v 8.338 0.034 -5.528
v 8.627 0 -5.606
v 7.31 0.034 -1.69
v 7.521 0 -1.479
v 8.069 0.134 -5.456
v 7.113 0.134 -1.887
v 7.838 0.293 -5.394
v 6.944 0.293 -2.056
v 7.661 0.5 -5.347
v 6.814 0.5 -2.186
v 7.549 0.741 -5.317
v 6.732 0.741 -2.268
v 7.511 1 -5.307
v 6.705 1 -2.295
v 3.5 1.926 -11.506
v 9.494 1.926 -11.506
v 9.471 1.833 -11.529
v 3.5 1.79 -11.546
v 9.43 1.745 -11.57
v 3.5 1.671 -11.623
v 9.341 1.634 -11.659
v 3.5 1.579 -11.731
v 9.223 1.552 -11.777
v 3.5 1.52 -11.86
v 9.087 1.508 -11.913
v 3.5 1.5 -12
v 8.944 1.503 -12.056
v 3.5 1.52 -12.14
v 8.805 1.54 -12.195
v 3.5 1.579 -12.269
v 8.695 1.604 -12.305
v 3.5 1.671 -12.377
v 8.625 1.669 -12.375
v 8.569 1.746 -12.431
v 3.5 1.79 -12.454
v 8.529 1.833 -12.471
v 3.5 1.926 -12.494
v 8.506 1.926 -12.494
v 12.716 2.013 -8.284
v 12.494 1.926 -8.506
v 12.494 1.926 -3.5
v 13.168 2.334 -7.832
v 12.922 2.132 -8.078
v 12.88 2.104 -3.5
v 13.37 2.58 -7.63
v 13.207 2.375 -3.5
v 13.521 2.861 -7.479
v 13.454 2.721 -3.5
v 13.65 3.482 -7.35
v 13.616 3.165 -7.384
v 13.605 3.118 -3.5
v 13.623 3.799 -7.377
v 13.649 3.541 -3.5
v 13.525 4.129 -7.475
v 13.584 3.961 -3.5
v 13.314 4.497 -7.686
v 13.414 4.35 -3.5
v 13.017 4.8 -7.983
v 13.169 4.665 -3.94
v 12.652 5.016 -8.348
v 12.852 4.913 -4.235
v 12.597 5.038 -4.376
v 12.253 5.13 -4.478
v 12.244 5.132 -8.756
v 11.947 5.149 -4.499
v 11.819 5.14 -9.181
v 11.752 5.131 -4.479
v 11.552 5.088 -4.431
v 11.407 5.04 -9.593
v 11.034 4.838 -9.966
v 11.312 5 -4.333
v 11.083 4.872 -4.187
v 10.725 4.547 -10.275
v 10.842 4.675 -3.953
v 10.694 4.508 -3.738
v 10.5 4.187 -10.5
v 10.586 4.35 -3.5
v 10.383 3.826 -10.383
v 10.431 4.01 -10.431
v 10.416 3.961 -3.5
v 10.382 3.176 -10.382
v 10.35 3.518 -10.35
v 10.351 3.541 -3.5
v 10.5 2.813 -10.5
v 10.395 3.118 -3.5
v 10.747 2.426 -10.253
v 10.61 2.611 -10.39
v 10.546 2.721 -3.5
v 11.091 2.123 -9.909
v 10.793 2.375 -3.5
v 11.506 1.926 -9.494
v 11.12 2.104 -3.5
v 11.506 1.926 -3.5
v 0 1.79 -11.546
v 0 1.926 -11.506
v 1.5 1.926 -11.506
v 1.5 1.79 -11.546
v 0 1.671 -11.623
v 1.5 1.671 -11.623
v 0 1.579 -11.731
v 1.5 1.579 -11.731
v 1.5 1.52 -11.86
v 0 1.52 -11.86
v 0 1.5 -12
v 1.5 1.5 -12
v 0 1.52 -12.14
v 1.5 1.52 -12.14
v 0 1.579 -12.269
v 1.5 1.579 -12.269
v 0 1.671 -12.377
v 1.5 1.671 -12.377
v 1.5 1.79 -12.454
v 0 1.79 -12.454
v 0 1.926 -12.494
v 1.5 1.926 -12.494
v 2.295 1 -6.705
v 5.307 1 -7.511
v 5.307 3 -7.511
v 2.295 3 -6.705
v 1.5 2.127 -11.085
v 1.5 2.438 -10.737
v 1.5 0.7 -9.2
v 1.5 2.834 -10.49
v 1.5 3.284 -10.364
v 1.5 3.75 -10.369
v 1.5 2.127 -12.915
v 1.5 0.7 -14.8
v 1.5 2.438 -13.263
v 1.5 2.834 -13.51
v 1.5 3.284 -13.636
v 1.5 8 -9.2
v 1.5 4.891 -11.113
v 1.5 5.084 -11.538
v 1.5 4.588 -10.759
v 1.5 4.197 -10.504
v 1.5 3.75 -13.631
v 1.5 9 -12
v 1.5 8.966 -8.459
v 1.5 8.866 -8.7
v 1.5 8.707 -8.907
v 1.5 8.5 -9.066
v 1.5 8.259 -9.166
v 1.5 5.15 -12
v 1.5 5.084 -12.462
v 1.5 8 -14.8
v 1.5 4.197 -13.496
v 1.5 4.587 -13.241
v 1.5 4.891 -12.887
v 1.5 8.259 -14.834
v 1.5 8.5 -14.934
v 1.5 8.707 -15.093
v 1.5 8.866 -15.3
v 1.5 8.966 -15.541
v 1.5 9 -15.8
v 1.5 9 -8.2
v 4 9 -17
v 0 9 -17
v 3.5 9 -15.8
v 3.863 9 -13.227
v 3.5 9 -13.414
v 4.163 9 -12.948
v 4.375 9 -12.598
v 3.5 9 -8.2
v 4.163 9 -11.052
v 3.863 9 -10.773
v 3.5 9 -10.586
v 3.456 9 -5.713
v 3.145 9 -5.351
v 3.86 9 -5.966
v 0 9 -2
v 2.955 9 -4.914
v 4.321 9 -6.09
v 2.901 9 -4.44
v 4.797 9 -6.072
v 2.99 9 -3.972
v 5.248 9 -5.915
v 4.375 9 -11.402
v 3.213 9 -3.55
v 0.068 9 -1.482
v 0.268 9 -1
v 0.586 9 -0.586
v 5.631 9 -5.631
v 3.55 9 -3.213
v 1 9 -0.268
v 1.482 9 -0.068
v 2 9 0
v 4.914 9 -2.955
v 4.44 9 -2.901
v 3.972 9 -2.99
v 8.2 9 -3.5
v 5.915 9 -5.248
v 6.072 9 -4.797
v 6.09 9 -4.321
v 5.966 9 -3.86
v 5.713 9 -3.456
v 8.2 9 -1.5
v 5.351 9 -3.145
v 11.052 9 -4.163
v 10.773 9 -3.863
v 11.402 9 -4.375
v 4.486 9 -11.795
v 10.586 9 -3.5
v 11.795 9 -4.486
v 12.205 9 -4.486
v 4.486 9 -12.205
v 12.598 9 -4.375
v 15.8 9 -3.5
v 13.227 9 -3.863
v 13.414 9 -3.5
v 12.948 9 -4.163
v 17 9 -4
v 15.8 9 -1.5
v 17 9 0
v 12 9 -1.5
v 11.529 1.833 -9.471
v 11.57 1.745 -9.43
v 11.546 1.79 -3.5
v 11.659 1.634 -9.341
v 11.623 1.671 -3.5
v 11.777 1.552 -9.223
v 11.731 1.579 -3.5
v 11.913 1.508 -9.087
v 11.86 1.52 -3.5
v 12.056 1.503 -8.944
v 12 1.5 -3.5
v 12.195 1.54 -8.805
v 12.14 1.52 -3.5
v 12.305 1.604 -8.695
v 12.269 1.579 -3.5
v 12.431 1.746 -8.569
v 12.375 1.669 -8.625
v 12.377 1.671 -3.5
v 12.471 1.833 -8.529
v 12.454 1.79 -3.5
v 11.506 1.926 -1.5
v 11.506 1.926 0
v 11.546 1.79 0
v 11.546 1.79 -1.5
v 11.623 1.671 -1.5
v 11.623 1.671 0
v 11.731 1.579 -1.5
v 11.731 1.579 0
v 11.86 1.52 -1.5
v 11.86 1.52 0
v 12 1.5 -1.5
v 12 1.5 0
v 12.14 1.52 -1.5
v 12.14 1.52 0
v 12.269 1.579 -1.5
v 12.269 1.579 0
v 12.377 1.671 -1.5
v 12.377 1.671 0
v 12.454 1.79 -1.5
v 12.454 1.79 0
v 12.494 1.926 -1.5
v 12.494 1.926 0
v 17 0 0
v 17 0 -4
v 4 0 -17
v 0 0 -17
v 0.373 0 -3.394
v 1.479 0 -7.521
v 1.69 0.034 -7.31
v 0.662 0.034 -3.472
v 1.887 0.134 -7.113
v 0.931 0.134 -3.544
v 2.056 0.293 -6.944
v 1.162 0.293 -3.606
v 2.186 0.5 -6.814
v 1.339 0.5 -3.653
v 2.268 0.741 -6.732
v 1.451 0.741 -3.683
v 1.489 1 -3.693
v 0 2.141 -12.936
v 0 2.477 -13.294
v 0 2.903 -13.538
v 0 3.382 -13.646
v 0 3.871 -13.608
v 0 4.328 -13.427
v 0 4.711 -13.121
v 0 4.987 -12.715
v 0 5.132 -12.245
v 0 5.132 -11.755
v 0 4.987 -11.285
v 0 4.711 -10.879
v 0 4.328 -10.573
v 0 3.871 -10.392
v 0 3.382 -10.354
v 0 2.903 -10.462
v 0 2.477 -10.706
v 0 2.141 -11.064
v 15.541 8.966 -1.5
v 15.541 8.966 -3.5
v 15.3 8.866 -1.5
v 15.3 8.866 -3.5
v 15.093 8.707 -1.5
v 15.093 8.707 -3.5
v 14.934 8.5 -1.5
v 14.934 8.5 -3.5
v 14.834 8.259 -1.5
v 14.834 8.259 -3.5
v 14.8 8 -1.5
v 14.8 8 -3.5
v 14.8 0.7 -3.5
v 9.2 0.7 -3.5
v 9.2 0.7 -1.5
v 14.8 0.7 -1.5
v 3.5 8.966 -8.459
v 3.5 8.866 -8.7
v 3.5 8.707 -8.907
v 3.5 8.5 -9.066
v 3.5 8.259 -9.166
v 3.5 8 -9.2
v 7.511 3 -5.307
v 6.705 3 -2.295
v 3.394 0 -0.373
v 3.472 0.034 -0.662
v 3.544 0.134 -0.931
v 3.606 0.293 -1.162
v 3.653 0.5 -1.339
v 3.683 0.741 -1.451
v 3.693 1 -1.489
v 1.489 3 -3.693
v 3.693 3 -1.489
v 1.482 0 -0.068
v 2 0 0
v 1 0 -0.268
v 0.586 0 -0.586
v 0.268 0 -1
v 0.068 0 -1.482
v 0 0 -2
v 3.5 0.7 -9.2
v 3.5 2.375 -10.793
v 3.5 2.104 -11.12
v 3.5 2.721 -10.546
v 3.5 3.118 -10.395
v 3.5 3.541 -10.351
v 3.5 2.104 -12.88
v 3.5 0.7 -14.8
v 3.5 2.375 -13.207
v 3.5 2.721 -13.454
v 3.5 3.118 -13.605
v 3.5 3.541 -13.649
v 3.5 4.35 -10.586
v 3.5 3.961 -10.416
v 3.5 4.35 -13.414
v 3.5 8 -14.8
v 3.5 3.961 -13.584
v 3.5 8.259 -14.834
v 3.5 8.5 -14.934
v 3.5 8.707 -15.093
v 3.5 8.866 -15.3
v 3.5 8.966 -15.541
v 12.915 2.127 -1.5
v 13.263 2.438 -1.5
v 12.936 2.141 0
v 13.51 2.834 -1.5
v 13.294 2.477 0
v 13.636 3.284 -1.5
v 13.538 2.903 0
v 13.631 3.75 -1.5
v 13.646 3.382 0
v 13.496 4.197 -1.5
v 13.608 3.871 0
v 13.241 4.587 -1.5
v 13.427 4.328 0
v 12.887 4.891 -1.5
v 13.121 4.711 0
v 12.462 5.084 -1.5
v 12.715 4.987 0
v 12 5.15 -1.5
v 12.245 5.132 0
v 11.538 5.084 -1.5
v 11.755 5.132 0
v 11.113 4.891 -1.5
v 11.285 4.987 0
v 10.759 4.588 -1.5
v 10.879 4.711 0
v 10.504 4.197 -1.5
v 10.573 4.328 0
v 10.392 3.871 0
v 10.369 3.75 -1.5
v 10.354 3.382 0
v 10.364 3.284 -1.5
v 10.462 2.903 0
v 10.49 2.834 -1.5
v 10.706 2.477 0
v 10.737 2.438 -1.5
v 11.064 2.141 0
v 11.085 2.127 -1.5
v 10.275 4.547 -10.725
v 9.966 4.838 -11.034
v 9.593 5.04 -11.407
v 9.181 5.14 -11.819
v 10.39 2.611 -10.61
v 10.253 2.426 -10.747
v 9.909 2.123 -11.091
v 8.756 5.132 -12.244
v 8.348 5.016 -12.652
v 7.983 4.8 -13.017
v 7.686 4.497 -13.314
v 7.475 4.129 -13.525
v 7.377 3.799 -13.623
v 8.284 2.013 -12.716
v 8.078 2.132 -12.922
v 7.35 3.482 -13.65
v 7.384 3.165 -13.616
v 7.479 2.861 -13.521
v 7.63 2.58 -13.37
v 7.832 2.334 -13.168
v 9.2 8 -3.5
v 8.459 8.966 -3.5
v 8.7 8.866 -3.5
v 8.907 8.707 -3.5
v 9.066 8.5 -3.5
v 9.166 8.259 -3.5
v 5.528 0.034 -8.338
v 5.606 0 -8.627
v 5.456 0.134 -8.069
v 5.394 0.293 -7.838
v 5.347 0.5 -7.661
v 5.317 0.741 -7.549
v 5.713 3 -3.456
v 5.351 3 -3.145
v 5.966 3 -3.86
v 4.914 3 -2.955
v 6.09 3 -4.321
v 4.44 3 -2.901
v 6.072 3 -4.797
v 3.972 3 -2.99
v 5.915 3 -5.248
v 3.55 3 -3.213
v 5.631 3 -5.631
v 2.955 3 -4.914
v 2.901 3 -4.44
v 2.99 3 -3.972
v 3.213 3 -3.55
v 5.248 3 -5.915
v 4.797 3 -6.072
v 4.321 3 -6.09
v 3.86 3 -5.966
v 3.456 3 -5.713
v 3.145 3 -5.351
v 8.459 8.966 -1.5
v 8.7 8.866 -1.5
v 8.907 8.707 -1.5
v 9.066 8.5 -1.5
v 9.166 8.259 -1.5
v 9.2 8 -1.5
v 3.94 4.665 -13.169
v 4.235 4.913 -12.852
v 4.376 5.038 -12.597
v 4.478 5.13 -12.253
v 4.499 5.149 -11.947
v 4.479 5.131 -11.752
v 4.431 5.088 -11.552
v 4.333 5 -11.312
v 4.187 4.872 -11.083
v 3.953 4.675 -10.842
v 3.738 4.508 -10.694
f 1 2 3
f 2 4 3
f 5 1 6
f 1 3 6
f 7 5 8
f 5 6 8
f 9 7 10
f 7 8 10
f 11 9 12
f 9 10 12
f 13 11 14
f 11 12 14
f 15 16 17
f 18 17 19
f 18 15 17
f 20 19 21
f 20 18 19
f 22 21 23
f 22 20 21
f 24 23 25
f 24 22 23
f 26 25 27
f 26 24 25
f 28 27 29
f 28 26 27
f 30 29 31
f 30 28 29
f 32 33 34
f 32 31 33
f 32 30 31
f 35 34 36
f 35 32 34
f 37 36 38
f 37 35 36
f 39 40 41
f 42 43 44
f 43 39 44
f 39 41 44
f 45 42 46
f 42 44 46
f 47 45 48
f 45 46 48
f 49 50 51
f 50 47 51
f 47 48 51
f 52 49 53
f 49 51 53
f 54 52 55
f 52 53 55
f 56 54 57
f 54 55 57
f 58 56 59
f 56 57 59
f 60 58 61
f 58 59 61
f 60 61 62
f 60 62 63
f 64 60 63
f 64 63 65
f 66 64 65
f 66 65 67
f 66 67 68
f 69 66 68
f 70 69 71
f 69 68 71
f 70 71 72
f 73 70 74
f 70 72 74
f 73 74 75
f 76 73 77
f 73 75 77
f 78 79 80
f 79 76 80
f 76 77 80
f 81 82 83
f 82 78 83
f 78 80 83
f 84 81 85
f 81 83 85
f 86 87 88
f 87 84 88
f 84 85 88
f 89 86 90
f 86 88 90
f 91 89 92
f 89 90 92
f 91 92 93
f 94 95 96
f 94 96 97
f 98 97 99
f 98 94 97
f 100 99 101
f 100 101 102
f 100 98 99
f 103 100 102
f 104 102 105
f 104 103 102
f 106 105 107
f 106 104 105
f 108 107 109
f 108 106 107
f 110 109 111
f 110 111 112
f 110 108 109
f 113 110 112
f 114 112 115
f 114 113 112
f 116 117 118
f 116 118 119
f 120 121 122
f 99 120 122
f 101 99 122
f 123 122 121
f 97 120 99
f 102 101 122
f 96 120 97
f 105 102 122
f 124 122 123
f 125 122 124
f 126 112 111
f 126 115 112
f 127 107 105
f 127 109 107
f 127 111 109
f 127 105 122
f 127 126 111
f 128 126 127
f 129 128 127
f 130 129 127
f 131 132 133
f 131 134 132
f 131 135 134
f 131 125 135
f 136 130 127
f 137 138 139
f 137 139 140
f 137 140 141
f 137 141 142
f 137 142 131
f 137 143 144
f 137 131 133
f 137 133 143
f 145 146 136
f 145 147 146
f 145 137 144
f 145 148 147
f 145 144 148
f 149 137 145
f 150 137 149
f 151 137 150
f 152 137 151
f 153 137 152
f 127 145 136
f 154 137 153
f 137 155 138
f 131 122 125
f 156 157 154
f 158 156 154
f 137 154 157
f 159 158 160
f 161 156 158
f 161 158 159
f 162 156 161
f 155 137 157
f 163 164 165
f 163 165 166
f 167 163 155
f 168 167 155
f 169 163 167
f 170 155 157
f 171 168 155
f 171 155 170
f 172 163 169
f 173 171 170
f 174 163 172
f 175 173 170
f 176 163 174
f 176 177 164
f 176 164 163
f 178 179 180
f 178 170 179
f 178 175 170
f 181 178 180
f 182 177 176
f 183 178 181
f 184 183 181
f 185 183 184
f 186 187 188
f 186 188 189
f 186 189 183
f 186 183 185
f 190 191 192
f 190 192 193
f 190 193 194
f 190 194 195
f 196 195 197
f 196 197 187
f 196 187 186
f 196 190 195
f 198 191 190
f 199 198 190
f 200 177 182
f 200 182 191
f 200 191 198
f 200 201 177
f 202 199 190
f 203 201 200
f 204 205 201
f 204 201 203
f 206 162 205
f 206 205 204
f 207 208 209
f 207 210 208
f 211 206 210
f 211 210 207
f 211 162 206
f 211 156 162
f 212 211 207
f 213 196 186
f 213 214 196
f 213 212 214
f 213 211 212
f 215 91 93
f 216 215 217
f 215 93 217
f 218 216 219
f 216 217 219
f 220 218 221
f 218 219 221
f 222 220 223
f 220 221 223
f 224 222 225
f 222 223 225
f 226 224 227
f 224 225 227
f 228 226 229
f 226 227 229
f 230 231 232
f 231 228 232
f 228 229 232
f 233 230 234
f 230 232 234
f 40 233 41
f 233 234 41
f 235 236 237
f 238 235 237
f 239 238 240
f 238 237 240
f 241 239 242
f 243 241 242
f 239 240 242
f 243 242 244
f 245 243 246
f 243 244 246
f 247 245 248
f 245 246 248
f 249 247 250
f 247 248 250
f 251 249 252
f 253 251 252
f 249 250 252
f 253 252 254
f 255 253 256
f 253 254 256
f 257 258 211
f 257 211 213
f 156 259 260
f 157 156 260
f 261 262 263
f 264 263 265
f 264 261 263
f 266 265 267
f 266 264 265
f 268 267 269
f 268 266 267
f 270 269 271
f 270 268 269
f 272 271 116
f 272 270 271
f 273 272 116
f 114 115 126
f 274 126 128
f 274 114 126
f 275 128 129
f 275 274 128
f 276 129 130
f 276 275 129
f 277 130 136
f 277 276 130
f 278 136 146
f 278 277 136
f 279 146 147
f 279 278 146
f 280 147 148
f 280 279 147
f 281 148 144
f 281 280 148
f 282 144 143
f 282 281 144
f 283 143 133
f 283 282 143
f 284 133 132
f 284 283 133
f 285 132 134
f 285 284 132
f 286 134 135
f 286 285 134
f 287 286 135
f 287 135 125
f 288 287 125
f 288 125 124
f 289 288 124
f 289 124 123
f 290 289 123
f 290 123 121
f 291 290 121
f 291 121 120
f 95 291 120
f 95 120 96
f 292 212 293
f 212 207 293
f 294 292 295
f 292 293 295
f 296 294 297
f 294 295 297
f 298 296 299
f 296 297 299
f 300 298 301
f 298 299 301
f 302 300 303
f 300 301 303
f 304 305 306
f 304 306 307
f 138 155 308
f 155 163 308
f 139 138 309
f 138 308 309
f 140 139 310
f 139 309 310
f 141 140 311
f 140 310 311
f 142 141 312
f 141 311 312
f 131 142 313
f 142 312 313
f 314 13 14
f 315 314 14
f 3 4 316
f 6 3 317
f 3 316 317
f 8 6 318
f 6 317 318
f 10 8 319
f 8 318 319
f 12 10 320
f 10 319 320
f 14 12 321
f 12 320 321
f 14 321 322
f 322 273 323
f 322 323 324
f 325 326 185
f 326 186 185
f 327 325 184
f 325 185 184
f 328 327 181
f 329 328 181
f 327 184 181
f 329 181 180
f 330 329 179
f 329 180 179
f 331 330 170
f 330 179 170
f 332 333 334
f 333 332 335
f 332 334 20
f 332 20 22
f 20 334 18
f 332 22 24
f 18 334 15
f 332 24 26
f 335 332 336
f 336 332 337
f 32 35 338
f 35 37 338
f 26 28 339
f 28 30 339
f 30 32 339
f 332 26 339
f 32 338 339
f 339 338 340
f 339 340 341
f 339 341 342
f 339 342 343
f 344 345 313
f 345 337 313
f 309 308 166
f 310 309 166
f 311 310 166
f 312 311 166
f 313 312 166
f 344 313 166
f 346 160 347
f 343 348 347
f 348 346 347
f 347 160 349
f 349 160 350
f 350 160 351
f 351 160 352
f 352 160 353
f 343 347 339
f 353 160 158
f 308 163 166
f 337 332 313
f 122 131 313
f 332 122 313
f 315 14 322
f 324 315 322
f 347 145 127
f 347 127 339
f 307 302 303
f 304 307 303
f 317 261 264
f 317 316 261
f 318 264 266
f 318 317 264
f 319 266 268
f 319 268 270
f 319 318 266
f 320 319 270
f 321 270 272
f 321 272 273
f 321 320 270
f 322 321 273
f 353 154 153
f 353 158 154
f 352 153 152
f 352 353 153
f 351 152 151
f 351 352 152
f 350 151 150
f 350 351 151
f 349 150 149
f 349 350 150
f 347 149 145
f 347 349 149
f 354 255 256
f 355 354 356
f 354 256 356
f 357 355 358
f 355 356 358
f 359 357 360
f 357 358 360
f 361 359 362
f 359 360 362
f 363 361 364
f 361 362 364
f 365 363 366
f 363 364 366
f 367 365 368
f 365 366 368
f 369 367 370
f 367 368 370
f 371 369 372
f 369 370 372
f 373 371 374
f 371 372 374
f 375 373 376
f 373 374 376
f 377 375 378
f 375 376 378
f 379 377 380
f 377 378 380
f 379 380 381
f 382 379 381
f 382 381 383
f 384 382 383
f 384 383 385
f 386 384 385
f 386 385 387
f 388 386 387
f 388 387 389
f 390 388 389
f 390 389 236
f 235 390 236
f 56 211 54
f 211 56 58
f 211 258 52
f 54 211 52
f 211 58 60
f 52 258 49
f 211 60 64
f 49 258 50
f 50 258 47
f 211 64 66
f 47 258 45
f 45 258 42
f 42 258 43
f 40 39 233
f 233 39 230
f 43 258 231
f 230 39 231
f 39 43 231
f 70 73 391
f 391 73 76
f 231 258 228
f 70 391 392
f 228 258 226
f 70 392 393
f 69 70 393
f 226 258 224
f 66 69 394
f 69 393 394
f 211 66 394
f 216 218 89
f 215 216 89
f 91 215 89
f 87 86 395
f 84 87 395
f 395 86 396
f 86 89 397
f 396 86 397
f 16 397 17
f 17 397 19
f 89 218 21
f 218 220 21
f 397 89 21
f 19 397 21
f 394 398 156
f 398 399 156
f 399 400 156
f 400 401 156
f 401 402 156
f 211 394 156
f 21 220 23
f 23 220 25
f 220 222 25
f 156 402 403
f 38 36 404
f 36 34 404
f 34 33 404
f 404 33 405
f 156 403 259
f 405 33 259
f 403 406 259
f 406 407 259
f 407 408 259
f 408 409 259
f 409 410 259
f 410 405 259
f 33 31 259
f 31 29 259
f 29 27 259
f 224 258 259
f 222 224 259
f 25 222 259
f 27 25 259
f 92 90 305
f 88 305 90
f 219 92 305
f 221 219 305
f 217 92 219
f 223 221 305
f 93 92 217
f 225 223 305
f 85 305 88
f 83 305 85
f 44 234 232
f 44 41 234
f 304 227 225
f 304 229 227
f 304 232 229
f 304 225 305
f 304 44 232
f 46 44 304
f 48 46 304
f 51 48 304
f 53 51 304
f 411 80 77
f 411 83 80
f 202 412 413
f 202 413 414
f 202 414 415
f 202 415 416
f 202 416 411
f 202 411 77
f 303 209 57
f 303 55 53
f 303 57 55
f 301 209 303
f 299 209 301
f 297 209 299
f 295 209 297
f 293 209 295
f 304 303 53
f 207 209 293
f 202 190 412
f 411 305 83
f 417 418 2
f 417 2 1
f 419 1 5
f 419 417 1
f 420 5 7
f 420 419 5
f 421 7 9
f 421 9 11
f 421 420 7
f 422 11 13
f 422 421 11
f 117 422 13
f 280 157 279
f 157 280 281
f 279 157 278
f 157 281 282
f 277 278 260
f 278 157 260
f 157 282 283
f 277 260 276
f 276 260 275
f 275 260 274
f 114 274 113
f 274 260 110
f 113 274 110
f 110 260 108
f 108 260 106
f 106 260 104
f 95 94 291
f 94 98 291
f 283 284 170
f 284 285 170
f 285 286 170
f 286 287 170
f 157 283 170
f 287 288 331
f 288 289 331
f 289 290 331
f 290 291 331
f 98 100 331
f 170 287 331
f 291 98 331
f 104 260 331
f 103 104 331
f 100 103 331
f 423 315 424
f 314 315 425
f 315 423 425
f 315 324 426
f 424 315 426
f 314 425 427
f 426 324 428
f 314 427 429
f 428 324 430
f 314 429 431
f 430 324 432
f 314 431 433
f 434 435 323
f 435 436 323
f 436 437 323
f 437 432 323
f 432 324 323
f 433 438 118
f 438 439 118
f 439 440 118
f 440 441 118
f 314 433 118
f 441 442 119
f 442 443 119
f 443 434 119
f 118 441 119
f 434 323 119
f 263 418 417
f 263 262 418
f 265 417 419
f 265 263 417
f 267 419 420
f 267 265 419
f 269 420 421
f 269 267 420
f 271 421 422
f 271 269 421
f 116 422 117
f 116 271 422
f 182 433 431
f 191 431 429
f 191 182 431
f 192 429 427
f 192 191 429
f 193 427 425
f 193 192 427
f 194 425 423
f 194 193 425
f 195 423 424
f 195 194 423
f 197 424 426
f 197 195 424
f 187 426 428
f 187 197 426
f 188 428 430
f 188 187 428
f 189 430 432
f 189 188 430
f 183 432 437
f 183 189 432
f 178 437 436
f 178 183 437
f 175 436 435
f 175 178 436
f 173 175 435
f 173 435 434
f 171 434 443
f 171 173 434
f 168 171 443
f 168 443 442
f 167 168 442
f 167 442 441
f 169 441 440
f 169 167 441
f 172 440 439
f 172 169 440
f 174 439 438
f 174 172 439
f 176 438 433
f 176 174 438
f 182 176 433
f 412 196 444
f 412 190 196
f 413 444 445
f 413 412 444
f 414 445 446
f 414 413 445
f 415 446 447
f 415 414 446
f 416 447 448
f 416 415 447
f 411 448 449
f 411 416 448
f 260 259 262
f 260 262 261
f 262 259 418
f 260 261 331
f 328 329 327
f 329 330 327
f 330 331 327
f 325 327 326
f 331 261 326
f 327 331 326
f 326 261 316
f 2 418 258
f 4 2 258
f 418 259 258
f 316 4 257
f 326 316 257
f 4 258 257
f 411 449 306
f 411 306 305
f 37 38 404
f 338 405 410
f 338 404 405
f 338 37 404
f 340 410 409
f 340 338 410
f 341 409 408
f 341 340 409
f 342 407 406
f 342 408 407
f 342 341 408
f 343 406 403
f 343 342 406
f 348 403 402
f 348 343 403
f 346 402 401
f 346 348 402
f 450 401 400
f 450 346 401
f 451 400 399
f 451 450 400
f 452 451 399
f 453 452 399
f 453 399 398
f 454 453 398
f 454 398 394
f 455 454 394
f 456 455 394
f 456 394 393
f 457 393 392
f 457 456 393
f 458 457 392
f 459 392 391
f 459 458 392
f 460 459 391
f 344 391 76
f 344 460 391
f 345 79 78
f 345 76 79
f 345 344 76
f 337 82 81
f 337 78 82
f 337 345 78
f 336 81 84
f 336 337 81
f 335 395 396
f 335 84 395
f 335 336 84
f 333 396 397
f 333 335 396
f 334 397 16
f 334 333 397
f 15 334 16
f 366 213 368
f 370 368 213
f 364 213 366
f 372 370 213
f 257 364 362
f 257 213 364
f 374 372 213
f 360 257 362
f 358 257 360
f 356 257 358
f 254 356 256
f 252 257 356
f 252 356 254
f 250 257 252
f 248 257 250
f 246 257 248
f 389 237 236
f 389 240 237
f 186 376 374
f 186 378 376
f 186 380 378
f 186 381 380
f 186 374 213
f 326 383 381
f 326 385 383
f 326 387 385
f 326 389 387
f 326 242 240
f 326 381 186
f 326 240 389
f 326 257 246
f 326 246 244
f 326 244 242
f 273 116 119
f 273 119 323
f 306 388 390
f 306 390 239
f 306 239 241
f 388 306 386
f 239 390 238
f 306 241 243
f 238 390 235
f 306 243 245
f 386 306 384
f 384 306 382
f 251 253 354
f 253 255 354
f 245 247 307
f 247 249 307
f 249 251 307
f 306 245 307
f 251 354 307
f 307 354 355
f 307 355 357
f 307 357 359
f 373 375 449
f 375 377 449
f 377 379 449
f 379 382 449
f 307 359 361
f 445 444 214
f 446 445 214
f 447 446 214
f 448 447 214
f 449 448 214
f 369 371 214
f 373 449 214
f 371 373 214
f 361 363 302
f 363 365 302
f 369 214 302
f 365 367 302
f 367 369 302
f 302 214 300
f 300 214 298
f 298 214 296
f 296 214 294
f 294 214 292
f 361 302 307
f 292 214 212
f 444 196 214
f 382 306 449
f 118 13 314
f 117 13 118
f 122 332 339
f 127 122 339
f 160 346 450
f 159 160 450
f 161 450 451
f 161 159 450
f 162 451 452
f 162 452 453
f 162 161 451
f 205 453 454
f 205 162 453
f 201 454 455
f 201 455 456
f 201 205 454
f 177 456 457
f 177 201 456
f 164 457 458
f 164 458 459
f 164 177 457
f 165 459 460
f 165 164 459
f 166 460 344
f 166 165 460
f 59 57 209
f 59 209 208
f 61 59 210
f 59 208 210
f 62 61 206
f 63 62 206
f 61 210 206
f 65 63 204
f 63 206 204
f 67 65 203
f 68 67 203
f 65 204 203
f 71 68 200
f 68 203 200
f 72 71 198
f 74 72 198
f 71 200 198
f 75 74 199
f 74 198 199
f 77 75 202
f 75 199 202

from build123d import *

# Parameters (mm, degrees)
BOSS_EXTRUDE1_DEPTH     = 9
SKETCH2_W               = 5.6
SKETCH2_H               = 2
CUT_EXTRUDE1_DEPTH      = 8.3
CUT_EXTRUDE2_DEPTH      = 22.914607001
CUT_EXTRUDE5_REACH      = 23.915
CUT_EXTRUDE5_END_RADIUS = 1.65
SKETCH16_R              = 1.5
FILLET2_R               = 1
SKETCH6_R               = 1.6
CUT_EXTRUDE3_DEPTH      = 22.914607049
CUT_EXTRUDE4_DEPTH      = 3
FILLET3_R               = 1
FILLET1_R               = 2


with BuildPart() as part:
    # Sketch1 → Boss-Extrude1 (new body)
    with BuildSketch(Plane(origin=(0, 0, 0), x_dir=(1, 0, 0), z_dir=(0, 1, 0))):
        Polygon((10.5, 10.5), (17, 4), (17, 0), (0, 0), align=None)
    extrude(amount=BOSS_EXTRUDE1_DEPTH)

    # Sketch2 → Cut-Extrude1 (cut)
    with BuildSketch(Plane(origin=(0, 9, 0), x_dir=(1, 0, 0), z_dir=(0, 1, 0))):
        with Locations((12, 2.5)):
            Rectangle(SKETCH2_W, SKETCH2_H)
    extrude(amount=-CUT_EXTRUDE1_DEPTH, mode=Mode.SUBTRACT)

    # Sketch4 → Cut-Extrude2 (cut, through all)
    with BuildSketch(Plane.XY):
        with BuildLine():
            ThreePointArc((12.49446871, 1.925833333), (12, 5.15), (11.50553129, 1.925833333))
            ThreePointArc((11.50553129, 1.925833333), (12, 1.5), (12.49446871, 1.925833333))
        make_face()
    extrude(amount=-CUT_EXTRUDE2_DEPTH, mode=Mode.SUBTRACT)

    # Cut-Extrude5: up to this cylinder (the profile starts outside it)
    cut_extrude5_end = Plane(origin=(12, 3.5, -3), z_dir=(0, 0, 1)) * Cylinder(CUT_EXTRUDE5_END_RADIUS, 52.13, mode=Mode.PRIVATE)
    # Sketch16 → Cut-Extrude5 (cut, up to the surface)
    with BuildSketch(Plane(origin=(0, 9, 0), x_dir=(1, 0, 0), z_dir=(0, 1, 0)), mode=Mode.PRIVATE) as cut_extrude5_sk1:
        with Locations((12, 3)):
            Circle(SKETCH16_R)
    cut_extrude5_tool1 = extrude(cut_extrude5_sk1.sketch, amount=-CUT_EXTRUDE5_REACH, mode=Mode.PRIVATE) - cut_extrude5_end
    add(cut_extrude5_tool1.solids().sort_by_distance((12, 9, -3))[0], mode=Mode.SUBTRACT)

    # Fillet2
    fillet2_edges = [part.edges().sort_by_distance(p)[0] for p in [
        (14.8, 9, -2.5),
        (9.2, 9, -2.5),
    ]]
    fillet(fillet2_edges, radius=FILLET2_R)

    # Sketch6 → Cut-Extrude3 (cut, through all)
    with BuildSketch(Plane(origin=(0, 9, 0), x_dir=(1, 0, 0), z_dir=(0, 1, 0))):
        with Locations((4.5, 4.5)):
            Circle(SKETCH6_R)
    extrude(amount=-CUT_EXTRUDE3_DEPTH, mode=Mode.SUBTRACT)

    # Sketch9 → Cut-Extrude4 (cut)
    with BuildSketch(Plane.XZ):
        Polygon((7.511458693, -5.306917925), (6.704540769, -2.295459231), (3.693082075, -1.488541307), (1.488541307, -3.693082075), (2.295459231, -6.704540769), (5.306917925, -7.511458693), align=None)
    extrude(amount=-CUT_EXTRUDE4_DEPTH, mode=Mode.SUBTRACT)

    # Fillet3
    fillet3_edges = [part.edges().sort_by_distance(p)[0] for p in [
        (6.960323501, 0, -5.858053117),
        (7.107999731, 0, -3.801188578),
        (5.198811422, 0, -1.892000269),
        (3.141946883, 0, -2.039676499),
    ]]
    fillet(fillet3_edges, radius=FILLET3_R)

    # Mirror1: part across plane


with BuildPart() as part_1:
    add(part.part)
    add(part.part.mirror(Plane(origin=(0, 9, 0), x_dir=(-0.7071067811865432, 0, 0.7071067811865518), z_dir=(0.707106781186552, 0, 0.7071067811865431))))

    # Fillet1
    fillet1_edges = [part_1.edges().sort_by_distance(p)[0] for p in [
        (0, 4.5, 0),
    ]]
    fillet(fillet1_edges, radius=FILLET1_R)


solid = part_1.part
